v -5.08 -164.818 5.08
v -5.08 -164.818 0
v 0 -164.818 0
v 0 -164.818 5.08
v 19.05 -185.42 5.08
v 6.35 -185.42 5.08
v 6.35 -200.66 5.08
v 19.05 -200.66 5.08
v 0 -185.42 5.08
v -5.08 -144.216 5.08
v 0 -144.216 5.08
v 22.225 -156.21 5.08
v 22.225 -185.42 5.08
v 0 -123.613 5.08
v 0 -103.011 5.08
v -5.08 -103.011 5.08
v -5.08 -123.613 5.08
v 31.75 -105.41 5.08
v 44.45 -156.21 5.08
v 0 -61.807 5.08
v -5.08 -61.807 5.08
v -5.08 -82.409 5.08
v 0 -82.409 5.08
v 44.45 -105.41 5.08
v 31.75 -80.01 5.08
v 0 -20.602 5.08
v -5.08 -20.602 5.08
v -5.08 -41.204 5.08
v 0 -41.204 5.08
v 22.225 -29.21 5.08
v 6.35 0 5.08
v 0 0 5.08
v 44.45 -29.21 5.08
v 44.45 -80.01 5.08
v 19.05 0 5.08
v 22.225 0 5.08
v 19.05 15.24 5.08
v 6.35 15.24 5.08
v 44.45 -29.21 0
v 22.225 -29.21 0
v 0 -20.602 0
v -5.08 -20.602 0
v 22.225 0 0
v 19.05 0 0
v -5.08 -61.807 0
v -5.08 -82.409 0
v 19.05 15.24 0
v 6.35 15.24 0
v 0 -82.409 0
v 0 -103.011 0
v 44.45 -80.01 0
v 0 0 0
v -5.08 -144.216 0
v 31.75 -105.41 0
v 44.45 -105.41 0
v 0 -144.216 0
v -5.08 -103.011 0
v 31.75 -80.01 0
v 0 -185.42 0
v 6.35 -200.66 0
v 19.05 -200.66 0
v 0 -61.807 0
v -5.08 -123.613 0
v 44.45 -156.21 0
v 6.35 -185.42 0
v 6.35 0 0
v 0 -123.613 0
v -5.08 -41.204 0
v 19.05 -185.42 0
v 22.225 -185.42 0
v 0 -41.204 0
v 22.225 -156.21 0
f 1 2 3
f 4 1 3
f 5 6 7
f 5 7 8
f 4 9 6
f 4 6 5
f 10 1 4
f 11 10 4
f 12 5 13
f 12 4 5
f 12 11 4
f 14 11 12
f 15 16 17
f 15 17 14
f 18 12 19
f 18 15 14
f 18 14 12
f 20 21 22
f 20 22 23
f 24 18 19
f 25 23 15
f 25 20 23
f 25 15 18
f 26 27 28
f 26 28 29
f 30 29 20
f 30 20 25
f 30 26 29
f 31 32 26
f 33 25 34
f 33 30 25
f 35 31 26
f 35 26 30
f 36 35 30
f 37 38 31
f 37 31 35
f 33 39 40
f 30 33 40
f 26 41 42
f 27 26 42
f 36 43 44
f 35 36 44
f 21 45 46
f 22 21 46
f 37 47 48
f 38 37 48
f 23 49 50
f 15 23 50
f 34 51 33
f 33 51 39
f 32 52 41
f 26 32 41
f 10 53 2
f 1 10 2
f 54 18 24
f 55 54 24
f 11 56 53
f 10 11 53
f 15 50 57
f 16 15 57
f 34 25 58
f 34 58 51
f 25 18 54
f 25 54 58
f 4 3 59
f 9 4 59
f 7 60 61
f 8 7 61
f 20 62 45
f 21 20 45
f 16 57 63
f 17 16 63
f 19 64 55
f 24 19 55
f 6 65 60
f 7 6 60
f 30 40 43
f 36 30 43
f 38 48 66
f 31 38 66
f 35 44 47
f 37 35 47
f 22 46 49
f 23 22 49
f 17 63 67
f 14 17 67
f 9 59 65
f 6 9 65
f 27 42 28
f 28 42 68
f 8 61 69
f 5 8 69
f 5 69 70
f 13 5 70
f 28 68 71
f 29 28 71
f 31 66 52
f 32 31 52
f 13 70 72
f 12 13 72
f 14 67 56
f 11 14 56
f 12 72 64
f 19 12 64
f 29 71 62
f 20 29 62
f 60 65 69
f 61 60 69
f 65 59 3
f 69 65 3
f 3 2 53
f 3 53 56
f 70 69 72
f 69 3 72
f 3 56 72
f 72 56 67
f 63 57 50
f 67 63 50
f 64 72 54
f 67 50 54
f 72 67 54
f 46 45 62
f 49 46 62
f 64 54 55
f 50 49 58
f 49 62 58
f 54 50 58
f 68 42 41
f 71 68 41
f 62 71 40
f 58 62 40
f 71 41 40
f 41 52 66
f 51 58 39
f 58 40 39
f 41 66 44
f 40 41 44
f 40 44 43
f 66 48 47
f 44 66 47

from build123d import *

# Parameters (mm, degrees)
BOSS_EXTRUDE1_DEPTH = 5.08
SKETCH2_W           = 25.4
SKETCH2_H           = 25.4
CUT_EXTRUDE1_DEPTH  = 206.587072794


with BuildPart() as part:
    # Sketch1 → Boss-Extrude1 (new body)
    with BuildSketch(Plane.XY):
        Polygon((0, 0), (0, -20.602222222), (-5.08, -20.602222222), (-5.08, -41.204444444), (0, -41.204444444), (0, -61.806666667), (-5.08, -61.806666667), (-5.08, -82.408888889), (0, -82.408888889), (0, -103.011111111), (-5.08, -103.011111111), (-5.08, -123.613333333), (0, -123.613333333), (0, -144.215555556), (-5.08, -144.215555556), (-5.08, -164.817777778), (0, -164.817777778), (0, -185.42), (6.35, -185.42), (6.35, -200.66), (19.05, -200.66), (19.05, -185.42), (22.225, -185.42), (22.225, -156.21), (44.45, -156.21), (44.45, -29.21), (22.225, -29.21), (22.225, 0), (19.05, 0), (19.05, 15.24), (6.35, 15.24), (6.35, 0), align=None)
    extrude(amount=BOSS_EXTRUDE1_DEPTH)

    # Sketch2 → Cut-Extrude1 (cut, through all)
    with BuildSketch(Plane.XY.offset(5.08)):
        with Locations((44.45, -92.71)):
            Rectangle(SKETCH2_W, SKETCH2_H)
    extrude(amount=-CUT_EXTRUDE1_DEPTH, mode=Mode.SUBTRACT)


solid = part.part
